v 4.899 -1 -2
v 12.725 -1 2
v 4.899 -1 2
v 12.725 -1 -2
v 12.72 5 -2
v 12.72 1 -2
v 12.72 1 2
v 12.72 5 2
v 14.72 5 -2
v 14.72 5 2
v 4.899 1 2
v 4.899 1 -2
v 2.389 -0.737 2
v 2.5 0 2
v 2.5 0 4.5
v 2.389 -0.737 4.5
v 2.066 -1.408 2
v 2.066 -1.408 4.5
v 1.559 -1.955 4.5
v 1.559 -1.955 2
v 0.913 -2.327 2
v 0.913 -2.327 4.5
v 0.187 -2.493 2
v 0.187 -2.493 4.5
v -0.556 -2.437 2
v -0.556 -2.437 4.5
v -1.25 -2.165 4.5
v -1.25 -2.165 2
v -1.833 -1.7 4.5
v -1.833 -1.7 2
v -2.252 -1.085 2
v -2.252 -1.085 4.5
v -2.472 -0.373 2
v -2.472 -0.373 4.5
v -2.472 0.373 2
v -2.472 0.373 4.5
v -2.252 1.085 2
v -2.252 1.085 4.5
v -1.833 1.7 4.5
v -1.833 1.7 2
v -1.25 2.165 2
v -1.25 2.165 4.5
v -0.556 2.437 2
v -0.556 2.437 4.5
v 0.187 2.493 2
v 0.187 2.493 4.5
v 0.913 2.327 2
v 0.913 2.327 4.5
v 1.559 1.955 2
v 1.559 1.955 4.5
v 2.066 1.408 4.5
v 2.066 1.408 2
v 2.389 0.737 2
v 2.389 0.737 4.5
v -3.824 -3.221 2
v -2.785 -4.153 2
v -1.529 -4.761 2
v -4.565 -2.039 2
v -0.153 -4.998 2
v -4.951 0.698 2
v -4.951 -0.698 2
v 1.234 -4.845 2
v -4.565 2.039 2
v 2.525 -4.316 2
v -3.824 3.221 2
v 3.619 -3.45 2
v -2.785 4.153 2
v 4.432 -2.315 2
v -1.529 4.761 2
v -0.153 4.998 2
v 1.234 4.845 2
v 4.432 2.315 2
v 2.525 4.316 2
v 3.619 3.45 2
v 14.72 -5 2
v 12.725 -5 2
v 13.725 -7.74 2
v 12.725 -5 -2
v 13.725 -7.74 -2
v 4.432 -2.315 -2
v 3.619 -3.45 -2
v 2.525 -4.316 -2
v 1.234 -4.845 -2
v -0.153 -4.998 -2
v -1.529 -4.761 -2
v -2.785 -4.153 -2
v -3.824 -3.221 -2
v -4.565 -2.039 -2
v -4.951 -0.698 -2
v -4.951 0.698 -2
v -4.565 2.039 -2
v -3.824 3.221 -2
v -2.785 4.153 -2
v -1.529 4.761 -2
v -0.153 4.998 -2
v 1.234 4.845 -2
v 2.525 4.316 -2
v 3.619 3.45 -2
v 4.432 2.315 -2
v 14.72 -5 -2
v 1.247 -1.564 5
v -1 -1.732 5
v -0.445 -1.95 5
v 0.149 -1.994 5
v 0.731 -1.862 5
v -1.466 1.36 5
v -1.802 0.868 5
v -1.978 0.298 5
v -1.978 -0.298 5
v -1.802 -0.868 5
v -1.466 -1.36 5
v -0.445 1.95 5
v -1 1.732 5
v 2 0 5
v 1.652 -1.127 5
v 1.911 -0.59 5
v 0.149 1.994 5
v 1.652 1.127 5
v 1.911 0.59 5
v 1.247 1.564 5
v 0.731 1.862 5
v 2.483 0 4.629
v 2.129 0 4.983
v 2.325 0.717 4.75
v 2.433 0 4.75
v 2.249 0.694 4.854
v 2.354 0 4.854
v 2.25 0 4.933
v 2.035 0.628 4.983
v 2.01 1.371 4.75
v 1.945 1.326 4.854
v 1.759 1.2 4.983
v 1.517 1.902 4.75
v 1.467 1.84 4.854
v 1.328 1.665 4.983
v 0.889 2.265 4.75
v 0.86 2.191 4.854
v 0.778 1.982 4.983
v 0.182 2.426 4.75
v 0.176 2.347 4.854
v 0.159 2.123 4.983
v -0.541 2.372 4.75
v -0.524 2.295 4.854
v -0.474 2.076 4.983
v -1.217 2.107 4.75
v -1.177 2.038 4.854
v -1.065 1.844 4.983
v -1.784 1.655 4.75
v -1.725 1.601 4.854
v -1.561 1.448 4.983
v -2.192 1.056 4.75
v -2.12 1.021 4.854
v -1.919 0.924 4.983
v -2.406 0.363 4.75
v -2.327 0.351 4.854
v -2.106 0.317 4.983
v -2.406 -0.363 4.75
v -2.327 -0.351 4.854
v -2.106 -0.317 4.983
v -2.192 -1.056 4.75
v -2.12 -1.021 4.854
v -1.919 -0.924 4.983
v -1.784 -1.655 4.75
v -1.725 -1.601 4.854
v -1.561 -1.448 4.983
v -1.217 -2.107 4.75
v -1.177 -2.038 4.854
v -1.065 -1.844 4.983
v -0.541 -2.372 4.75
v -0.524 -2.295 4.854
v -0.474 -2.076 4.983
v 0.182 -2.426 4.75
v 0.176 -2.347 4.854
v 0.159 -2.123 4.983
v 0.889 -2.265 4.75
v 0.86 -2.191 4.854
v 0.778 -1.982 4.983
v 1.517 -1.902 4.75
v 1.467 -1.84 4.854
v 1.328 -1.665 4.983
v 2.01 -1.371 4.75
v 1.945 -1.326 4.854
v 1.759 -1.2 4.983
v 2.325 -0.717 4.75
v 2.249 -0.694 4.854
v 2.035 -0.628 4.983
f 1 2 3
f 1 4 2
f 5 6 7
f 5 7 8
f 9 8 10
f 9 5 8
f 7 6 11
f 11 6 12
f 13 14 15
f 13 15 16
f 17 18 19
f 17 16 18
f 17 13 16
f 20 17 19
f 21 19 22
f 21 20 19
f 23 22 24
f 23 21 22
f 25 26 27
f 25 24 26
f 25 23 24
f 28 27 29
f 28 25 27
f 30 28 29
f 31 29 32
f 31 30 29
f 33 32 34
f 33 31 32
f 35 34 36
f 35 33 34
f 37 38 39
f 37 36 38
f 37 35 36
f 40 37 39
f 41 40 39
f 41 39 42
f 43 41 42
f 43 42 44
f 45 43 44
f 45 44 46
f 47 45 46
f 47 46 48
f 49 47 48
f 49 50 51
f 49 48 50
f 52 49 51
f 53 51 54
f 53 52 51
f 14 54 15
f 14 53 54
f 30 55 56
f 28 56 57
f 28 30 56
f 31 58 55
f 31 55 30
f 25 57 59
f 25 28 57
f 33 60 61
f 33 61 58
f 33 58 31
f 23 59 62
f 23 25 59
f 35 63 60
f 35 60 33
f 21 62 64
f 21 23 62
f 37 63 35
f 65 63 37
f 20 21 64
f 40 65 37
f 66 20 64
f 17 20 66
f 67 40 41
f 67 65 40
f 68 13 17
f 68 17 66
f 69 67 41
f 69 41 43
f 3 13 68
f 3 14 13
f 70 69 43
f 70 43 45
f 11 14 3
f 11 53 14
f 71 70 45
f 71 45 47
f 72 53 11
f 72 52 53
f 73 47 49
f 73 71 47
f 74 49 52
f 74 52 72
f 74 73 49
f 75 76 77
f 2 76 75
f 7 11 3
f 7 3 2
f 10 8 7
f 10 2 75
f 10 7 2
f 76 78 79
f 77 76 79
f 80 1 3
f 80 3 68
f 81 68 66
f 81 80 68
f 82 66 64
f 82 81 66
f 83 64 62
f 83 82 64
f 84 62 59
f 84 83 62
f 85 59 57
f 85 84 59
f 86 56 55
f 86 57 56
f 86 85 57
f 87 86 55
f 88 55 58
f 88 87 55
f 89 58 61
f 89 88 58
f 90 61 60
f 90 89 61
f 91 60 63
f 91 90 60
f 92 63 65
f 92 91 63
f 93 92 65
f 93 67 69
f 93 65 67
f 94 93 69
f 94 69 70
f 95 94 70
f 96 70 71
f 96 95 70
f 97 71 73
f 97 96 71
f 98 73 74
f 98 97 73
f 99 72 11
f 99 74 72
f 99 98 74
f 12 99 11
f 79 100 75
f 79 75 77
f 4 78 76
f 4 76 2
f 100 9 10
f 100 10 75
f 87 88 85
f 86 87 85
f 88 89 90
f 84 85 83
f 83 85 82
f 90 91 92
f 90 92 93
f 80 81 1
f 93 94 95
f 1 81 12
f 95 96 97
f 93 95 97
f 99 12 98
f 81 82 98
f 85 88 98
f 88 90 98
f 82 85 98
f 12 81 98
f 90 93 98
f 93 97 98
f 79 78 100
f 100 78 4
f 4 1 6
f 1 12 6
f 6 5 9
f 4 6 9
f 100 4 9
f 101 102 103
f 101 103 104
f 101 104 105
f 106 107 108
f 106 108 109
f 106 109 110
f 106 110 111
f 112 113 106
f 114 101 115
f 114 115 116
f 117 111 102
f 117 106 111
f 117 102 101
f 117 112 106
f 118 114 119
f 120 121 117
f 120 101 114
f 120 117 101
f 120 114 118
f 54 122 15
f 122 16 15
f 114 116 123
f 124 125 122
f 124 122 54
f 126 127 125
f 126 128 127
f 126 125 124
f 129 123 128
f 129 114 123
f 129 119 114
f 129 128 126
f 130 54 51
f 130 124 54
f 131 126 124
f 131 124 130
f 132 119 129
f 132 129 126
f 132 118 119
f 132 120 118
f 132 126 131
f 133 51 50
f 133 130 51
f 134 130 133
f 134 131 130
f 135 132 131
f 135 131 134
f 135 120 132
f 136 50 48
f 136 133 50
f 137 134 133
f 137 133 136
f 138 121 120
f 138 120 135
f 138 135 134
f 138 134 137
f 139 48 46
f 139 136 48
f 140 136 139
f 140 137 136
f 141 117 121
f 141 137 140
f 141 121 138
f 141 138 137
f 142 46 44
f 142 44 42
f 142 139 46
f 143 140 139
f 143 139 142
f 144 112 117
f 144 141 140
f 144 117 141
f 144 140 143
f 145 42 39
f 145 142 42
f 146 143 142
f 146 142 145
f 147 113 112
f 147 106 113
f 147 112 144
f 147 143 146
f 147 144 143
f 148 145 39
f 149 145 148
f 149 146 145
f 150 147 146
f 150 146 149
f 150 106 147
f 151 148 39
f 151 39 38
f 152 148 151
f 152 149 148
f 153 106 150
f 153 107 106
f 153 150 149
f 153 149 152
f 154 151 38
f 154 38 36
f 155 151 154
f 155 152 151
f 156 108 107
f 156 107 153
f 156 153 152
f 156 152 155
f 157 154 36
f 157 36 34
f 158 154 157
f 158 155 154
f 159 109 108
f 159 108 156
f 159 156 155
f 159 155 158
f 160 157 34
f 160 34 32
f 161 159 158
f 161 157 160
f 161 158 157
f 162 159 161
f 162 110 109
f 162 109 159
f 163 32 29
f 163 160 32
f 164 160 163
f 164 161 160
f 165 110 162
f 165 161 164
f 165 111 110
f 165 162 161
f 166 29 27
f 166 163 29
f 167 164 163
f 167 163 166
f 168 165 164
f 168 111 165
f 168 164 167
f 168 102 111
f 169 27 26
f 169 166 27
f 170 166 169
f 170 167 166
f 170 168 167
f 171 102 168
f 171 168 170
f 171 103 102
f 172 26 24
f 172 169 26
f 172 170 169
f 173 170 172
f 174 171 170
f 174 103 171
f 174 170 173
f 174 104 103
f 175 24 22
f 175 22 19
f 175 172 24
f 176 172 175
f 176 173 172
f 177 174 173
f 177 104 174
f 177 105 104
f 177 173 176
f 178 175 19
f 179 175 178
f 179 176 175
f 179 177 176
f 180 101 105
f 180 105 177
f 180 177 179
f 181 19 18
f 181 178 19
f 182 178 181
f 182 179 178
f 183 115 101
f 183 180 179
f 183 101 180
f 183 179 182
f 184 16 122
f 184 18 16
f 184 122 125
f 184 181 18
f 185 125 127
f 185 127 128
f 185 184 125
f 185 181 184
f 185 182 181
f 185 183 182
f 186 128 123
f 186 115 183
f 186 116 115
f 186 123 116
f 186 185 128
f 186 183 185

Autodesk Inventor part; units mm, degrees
ref_plane "YZ Plane" through (0, 0, 0) normal (1, 0, 0) x (0, 1, 0)
ref_plane "XZ Plane" through (0, 0, 0) normal (0, 1, 0) x (-1, 0, 0)
ref_plane "XY Plane" through (0, 0, 0) normal (0, 0, 1) x (1, 0, 0)
sketch "Esboço1" plane through (0, 0, 0) normal (0, 0, 1) x (1, 0, 0)
  arc A0 (4.899, 1) -> (4.899, -1) centre (0, 0) ccw
  line L0 (14.72, 0) -> (14.72, 1)
  line L1 (12.72, 1) -> (4.899, 1)
  line L2 (0, 0) -> (14.72, 0) construction
  line L3 (14.72, 0) -> (14.72, -1)
  line L4 (12.7254, -1) -> (4.899, -1)
  line L5 (12.72, 5) -> (14.72, 5)
  line L6 (14.72, 5) -> (14.72, -5)
  line L7 (14.72, -5) -> (12.7254, -5) construction
  line L8 (12.7254, -5) -> (12.7254, -1)
  line L9 (12.72, 1) -> (12.72, 5)
  line L10 (12.7254, -5) -> (13.7254, -7.74)
  line L11 (14.72, -5) -> (13.7254, -7.74)
  dimension "d9" = 10
  dimension "d10" = 1
  dimension "d11" = 1
  dimension "d13" = 2
  dimension "d14" = 10
  dimension "d15" = 4
  dimension "d16" = 4
  dimension "d18" = 40
  dimension "d19" = 2.74
extrude "Extrusão1" add sketch "Esboço1" along normal mid plane 4
sketch "Esboço2" plane through (0, 0, 2) normal (0, 0, 1) x (1, 0, 0)
  circle A0 centre (0, 0) radius 2.5
  dimension "d22" = 5
extrude "Extrusão2" add sketch "Esboço2" along normal blind 3
fillet "Arredondamento1" radius 0.5 1 edges at (-2.5, 0, 5)
properties part number "solda"
